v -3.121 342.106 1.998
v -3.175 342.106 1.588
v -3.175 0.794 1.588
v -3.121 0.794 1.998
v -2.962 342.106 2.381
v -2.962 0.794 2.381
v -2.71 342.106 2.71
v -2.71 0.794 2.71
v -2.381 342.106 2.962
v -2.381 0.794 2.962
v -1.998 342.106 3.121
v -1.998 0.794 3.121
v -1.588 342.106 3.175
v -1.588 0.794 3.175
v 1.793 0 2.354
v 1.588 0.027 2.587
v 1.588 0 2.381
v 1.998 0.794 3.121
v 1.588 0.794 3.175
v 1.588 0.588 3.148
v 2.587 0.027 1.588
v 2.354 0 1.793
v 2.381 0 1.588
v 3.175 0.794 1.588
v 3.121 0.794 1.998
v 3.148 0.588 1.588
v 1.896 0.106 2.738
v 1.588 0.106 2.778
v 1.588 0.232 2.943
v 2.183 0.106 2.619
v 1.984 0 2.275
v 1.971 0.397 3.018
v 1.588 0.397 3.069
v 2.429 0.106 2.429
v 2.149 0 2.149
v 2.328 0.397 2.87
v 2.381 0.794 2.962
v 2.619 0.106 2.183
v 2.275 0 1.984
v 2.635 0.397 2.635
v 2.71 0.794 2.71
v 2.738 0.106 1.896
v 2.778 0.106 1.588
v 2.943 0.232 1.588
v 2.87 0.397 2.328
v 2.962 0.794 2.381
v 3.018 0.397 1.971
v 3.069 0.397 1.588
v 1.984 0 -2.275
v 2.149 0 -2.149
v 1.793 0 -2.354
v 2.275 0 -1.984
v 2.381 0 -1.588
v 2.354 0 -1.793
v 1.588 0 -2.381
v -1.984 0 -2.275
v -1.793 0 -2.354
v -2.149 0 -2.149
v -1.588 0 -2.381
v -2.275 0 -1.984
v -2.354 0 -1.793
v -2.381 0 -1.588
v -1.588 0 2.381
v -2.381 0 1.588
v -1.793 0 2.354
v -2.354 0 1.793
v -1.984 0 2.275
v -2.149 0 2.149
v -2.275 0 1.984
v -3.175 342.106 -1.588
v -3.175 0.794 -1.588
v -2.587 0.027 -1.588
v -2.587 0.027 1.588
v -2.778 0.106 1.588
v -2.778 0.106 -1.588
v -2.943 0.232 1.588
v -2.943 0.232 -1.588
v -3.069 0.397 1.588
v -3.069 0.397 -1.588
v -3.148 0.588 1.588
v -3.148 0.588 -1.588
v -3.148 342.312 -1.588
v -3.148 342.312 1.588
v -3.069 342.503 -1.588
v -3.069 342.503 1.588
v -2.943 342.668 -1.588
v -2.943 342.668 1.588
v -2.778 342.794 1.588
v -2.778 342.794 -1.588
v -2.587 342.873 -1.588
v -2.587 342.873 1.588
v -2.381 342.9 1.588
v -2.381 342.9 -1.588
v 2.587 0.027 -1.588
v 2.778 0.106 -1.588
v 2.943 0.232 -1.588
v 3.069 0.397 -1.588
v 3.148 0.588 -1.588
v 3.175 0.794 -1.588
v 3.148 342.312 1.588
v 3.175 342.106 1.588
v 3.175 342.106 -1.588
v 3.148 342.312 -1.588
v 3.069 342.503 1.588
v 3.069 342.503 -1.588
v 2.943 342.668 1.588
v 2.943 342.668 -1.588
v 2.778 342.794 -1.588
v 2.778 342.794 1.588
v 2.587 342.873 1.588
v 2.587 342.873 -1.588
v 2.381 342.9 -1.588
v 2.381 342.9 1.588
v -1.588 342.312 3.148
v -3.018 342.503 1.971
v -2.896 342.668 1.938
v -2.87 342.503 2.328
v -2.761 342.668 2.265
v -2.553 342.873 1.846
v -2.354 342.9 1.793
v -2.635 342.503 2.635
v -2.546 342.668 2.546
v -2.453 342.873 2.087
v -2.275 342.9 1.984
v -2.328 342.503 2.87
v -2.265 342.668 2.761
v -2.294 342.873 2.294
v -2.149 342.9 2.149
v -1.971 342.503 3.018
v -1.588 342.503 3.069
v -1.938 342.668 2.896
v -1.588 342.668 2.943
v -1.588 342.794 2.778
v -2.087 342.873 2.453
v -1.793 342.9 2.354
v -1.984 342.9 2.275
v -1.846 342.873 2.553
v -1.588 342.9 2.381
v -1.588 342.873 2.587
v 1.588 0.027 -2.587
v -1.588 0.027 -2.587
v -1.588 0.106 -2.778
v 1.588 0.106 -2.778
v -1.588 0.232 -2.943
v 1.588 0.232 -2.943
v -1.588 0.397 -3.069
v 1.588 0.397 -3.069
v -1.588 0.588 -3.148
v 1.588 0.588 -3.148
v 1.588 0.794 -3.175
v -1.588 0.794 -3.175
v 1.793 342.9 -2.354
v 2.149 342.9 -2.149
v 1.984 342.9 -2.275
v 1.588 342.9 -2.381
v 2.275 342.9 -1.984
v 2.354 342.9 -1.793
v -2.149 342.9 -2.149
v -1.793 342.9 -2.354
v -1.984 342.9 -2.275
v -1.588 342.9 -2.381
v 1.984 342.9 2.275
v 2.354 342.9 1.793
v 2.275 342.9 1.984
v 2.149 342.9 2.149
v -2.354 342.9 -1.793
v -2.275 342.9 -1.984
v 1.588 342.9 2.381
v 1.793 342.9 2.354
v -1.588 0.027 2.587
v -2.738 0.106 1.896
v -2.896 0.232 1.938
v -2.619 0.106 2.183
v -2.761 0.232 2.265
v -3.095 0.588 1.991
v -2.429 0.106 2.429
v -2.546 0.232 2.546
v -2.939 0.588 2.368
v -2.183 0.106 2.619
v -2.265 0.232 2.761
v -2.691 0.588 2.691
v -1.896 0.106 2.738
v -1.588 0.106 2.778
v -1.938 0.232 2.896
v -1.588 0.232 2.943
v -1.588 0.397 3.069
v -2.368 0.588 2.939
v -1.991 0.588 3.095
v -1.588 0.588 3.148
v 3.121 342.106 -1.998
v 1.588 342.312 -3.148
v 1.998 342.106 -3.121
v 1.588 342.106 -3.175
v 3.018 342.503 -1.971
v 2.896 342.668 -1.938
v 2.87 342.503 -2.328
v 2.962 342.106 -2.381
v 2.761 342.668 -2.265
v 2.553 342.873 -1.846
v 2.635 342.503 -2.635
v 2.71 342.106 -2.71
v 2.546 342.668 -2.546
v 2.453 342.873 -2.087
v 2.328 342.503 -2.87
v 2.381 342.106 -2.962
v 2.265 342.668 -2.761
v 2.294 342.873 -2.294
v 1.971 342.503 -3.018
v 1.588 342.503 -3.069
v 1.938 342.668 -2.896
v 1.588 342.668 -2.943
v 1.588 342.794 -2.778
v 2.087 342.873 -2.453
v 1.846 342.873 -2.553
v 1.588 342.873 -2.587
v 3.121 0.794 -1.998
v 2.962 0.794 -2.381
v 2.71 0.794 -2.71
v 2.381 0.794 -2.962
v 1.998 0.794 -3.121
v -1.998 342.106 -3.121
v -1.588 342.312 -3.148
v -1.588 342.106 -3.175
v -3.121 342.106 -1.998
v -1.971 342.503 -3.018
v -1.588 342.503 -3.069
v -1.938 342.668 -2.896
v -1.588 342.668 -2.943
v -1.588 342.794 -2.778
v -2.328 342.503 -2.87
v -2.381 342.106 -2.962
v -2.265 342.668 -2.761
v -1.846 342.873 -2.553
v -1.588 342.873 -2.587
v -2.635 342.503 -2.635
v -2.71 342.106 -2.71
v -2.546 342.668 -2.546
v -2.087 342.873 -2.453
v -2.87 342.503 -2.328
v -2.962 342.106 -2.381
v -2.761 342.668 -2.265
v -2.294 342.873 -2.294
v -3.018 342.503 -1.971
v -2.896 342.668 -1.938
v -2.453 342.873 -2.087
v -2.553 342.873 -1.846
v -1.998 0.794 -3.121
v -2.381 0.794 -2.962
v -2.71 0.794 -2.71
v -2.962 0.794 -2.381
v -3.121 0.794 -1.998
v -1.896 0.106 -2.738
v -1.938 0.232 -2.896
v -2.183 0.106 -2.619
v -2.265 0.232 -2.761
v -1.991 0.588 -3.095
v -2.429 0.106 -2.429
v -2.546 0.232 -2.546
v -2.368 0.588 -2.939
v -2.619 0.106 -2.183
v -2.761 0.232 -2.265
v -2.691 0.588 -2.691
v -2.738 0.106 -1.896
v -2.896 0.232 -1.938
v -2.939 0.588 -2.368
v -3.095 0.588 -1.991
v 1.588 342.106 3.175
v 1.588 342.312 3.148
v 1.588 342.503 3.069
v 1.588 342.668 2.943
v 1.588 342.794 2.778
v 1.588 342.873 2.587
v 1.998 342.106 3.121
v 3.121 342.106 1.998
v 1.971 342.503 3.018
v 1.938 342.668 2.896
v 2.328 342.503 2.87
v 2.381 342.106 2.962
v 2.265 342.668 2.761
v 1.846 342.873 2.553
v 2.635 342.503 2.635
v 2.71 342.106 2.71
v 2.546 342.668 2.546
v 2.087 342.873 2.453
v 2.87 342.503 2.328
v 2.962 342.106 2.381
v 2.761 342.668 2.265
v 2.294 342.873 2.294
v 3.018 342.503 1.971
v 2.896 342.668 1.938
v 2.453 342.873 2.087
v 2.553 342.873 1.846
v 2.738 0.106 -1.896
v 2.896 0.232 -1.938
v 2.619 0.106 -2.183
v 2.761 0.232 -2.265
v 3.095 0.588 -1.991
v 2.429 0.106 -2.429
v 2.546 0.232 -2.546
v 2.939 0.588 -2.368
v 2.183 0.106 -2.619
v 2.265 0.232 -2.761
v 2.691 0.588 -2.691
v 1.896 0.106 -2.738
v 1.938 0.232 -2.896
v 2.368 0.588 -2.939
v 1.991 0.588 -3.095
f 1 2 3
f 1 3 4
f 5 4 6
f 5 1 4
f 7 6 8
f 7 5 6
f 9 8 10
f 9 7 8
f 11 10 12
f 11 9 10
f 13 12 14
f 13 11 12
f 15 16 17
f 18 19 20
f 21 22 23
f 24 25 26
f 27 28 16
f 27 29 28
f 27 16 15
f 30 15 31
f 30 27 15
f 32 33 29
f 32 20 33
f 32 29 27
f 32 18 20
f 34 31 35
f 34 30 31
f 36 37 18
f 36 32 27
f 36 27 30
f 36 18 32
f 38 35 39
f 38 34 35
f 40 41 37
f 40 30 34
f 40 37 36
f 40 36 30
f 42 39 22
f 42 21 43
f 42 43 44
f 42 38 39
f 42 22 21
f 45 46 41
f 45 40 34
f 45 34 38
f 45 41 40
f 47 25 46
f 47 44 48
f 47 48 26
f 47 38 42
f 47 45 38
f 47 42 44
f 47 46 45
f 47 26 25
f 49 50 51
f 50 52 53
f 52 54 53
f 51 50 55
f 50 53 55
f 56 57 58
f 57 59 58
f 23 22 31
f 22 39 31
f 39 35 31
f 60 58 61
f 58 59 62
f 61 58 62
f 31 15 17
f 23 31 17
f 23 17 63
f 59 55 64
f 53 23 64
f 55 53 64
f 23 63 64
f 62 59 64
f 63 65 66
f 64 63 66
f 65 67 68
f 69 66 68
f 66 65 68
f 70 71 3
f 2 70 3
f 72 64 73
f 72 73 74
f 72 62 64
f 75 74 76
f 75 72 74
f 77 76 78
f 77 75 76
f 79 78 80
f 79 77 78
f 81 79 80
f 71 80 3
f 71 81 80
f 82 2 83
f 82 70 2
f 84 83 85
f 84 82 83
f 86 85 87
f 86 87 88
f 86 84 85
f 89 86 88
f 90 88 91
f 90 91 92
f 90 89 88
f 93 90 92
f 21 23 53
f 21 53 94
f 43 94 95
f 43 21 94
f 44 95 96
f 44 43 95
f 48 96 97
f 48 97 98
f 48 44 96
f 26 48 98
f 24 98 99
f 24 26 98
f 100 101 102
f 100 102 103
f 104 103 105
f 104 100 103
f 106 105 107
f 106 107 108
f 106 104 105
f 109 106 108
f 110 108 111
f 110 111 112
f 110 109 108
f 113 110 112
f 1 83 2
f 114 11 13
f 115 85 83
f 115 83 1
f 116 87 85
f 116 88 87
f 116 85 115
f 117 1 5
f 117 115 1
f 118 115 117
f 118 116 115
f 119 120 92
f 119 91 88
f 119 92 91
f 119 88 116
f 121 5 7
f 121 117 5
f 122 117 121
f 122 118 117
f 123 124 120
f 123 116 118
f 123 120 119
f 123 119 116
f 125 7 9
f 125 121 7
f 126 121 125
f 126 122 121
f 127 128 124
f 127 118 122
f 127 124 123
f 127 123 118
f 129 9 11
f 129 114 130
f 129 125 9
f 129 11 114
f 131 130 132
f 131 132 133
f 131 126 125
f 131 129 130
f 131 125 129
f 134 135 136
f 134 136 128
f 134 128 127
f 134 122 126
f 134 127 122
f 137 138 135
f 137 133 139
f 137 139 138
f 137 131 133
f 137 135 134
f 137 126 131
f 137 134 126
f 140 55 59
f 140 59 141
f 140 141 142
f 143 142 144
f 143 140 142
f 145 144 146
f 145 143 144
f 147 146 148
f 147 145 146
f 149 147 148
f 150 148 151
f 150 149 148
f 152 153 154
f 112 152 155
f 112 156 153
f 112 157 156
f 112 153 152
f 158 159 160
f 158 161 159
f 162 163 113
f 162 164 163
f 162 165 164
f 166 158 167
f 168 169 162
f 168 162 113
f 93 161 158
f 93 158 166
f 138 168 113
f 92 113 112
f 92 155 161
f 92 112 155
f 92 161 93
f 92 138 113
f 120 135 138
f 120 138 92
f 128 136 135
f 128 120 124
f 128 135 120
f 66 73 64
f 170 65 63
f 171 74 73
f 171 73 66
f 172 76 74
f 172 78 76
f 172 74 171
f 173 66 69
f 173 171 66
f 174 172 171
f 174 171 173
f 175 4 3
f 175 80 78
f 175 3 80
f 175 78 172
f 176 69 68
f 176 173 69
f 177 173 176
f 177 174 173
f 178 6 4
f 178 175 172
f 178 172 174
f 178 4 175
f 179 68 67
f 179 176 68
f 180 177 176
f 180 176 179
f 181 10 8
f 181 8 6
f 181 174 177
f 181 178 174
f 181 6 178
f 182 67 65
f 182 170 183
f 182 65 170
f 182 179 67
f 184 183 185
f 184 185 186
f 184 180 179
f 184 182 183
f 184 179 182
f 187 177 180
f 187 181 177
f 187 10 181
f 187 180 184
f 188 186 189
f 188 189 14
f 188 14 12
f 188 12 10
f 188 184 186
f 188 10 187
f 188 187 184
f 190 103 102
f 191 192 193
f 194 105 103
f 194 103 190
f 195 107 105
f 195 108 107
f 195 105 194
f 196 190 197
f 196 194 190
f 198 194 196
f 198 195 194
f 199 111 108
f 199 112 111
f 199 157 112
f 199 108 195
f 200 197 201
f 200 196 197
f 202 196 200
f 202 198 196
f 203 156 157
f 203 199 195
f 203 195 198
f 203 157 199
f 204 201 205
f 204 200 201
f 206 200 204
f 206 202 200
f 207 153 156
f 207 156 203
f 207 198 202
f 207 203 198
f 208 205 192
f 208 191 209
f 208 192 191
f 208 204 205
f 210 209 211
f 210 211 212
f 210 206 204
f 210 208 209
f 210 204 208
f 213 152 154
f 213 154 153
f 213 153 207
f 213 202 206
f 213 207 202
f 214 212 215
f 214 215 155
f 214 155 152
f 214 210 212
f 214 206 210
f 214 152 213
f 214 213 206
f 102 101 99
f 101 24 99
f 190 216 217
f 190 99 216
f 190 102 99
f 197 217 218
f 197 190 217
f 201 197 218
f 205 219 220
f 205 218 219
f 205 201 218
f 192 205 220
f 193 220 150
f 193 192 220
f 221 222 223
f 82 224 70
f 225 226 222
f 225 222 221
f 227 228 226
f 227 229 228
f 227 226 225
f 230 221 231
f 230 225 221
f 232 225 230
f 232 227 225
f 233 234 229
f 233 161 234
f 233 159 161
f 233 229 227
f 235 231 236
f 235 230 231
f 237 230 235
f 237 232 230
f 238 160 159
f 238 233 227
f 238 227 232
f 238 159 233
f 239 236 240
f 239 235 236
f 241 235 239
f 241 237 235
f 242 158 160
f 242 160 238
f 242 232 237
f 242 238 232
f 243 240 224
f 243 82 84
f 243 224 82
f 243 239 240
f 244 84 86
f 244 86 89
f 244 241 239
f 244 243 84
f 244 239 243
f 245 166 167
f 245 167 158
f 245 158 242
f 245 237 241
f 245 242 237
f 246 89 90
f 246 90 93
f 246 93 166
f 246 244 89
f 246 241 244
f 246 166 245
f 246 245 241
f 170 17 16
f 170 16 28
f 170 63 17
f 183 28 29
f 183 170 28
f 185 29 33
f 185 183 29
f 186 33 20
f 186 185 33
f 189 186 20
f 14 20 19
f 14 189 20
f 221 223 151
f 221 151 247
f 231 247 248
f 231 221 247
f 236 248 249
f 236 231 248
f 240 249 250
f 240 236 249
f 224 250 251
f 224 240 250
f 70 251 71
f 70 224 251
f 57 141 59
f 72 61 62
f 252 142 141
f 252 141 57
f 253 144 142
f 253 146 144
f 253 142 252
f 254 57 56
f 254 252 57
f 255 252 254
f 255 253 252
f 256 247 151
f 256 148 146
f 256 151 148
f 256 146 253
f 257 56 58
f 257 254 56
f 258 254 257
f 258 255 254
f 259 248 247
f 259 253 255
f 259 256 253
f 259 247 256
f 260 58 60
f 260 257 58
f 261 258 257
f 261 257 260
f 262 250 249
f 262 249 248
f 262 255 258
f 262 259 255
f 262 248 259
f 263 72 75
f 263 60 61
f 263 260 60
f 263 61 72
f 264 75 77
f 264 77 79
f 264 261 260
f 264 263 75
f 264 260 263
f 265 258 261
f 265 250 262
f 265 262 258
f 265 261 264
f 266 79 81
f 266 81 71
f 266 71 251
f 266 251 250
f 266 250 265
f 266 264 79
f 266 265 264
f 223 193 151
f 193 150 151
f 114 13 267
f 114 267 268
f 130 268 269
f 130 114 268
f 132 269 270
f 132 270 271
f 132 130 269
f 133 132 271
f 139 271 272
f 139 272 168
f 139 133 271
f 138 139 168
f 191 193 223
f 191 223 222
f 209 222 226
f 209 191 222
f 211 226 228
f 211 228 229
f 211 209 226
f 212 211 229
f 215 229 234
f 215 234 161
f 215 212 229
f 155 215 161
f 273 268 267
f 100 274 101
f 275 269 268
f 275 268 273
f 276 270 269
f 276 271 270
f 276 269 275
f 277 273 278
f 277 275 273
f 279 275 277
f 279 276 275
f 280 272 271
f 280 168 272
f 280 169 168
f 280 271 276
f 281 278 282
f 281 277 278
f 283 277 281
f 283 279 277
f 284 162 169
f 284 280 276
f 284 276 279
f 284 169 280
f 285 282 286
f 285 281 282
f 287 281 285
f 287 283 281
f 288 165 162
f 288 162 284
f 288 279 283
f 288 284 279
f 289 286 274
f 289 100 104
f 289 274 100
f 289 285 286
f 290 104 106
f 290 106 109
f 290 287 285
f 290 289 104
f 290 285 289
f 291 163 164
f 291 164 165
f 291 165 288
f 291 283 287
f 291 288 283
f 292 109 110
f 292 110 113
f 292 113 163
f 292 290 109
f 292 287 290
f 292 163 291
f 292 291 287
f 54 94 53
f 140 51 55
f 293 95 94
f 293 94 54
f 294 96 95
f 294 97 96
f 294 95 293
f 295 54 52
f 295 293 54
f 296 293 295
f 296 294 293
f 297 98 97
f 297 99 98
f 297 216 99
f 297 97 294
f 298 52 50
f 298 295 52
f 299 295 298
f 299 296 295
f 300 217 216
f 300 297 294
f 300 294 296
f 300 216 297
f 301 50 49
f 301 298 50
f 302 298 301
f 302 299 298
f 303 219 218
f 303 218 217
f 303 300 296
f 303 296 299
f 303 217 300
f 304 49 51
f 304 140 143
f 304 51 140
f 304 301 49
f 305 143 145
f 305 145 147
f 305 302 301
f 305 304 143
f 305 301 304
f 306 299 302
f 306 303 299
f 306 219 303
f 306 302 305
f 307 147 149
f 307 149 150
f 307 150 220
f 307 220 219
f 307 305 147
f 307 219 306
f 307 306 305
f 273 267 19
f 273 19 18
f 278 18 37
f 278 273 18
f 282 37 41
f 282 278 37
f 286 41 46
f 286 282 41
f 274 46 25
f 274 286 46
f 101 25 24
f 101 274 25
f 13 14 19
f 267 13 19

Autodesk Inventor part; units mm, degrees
ref_plane "YZ Plane" through (0, 0, 0) normal (1, 0, 0) x (0, 1, 0)
ref_plane "XZ Plane" through (0, 0, 0) normal (0, 1, 0) x (-1, 0, 0)
ref_plane "XY Plane" through (0, 0, 0) normal (0, 0, 1) x (1, 0, 0)
sketch "Sketch1" plane through (0, 0, 0) normal (0, 1, 0) x (-1, 0, 0)
  line L0 (-3.175, -3.175) -> (3.175, -3.175)
  line L1 (3.175, -3.175) -> (3.175, 3.175)
  line L2 (3.175, 3.175) -> (-3.175, 3.175)
  line L3 (-3.175, 3.175) -> (-3.175, -3.175)
  line L4 (-3.175, -3.175) -> (3.175, 3.175) construction
  line L5 (3.175, -3.175) -> (-3.175, 3.175) construction
  point P0 (0, 0)
  dimension "d0" = 6.35
  dimension "d1" = 6.35
extrude "Extrusion1" add sketch "Sketch1" along normal blind 342.9
fillet "Fillet1" radius 1.5875 4 edges at (3.175, 171.45, 3.175) (3.175, 171.45, -3.175) (-3.175, 171.45, 3.175) (-3.175, 171.45, -3.175)
fillet "Fillet2" radius 0.7937 16 edges at (2.71, 0, 2.71) (3.175, 0, 0) (2.71, 0, -2.71) (0, 0, -3.175) (-2.71, 0, -2.71) (-3.175, 0, 0) (-2.71, 0, 2.71) (0, 0, 3.175) (2.71, 342.9, 2.71) (3.175, 342.9, 0) (2.71, 342.9, -2.71) (0, 342.9, -3.175) (-2.71, 342.9, -2.71) (-3.175, 342.9, 0) (-2.71, 342.9, 2.71) (0, 342.9, 3.175)
properties part number "13.5in hs shaft" material "Stainless Steel"
